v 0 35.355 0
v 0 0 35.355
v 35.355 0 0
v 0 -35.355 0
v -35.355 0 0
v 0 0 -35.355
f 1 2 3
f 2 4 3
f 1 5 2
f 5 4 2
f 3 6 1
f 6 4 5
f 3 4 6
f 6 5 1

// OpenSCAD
// file: math.scad
/**
 * calculates a hypotenuse.
 * @a - first (or only) side
 * @b - optional second side
 */
function hyp(a, b) = (b == undef) ?
    (a ^ 2 + a ^ 2) ^ .5 :
    (a ^ 2 + b ^ 2) ^ .5;
// file: mirrorCopy.scad
// A custom mirror module that retains the original
// object in addition to the mirrored one.
// deprecated - use BOSL2's version instead instead
module mirrorCopy(v = [1, 0, 0]) {
    children();
    mirror(v) children();
}
// main file
use <mirrorCopy.scad>;
use <math.scad>;

module octohedron(radius) {
    rotate([0,0,45])
    mirrorCopy([0,0,-1])
    polyhedron(
        // the four points at base
        points=[ [radius,radius,0],[radius,-radius,0],[-radius,-radius,0],[-radius,radius,0],
        // the apex point
            [0,0,hyp(radius)]  ],
        // each triangle side
        faces=[ [0,1,4],[1,2,4],[2,3,4],[3,0,4],
        // two triangles for square base
            [1,0,3],[2,1,3] ]
    );
}

color("DeepPink")
octohedron(radius=25);
